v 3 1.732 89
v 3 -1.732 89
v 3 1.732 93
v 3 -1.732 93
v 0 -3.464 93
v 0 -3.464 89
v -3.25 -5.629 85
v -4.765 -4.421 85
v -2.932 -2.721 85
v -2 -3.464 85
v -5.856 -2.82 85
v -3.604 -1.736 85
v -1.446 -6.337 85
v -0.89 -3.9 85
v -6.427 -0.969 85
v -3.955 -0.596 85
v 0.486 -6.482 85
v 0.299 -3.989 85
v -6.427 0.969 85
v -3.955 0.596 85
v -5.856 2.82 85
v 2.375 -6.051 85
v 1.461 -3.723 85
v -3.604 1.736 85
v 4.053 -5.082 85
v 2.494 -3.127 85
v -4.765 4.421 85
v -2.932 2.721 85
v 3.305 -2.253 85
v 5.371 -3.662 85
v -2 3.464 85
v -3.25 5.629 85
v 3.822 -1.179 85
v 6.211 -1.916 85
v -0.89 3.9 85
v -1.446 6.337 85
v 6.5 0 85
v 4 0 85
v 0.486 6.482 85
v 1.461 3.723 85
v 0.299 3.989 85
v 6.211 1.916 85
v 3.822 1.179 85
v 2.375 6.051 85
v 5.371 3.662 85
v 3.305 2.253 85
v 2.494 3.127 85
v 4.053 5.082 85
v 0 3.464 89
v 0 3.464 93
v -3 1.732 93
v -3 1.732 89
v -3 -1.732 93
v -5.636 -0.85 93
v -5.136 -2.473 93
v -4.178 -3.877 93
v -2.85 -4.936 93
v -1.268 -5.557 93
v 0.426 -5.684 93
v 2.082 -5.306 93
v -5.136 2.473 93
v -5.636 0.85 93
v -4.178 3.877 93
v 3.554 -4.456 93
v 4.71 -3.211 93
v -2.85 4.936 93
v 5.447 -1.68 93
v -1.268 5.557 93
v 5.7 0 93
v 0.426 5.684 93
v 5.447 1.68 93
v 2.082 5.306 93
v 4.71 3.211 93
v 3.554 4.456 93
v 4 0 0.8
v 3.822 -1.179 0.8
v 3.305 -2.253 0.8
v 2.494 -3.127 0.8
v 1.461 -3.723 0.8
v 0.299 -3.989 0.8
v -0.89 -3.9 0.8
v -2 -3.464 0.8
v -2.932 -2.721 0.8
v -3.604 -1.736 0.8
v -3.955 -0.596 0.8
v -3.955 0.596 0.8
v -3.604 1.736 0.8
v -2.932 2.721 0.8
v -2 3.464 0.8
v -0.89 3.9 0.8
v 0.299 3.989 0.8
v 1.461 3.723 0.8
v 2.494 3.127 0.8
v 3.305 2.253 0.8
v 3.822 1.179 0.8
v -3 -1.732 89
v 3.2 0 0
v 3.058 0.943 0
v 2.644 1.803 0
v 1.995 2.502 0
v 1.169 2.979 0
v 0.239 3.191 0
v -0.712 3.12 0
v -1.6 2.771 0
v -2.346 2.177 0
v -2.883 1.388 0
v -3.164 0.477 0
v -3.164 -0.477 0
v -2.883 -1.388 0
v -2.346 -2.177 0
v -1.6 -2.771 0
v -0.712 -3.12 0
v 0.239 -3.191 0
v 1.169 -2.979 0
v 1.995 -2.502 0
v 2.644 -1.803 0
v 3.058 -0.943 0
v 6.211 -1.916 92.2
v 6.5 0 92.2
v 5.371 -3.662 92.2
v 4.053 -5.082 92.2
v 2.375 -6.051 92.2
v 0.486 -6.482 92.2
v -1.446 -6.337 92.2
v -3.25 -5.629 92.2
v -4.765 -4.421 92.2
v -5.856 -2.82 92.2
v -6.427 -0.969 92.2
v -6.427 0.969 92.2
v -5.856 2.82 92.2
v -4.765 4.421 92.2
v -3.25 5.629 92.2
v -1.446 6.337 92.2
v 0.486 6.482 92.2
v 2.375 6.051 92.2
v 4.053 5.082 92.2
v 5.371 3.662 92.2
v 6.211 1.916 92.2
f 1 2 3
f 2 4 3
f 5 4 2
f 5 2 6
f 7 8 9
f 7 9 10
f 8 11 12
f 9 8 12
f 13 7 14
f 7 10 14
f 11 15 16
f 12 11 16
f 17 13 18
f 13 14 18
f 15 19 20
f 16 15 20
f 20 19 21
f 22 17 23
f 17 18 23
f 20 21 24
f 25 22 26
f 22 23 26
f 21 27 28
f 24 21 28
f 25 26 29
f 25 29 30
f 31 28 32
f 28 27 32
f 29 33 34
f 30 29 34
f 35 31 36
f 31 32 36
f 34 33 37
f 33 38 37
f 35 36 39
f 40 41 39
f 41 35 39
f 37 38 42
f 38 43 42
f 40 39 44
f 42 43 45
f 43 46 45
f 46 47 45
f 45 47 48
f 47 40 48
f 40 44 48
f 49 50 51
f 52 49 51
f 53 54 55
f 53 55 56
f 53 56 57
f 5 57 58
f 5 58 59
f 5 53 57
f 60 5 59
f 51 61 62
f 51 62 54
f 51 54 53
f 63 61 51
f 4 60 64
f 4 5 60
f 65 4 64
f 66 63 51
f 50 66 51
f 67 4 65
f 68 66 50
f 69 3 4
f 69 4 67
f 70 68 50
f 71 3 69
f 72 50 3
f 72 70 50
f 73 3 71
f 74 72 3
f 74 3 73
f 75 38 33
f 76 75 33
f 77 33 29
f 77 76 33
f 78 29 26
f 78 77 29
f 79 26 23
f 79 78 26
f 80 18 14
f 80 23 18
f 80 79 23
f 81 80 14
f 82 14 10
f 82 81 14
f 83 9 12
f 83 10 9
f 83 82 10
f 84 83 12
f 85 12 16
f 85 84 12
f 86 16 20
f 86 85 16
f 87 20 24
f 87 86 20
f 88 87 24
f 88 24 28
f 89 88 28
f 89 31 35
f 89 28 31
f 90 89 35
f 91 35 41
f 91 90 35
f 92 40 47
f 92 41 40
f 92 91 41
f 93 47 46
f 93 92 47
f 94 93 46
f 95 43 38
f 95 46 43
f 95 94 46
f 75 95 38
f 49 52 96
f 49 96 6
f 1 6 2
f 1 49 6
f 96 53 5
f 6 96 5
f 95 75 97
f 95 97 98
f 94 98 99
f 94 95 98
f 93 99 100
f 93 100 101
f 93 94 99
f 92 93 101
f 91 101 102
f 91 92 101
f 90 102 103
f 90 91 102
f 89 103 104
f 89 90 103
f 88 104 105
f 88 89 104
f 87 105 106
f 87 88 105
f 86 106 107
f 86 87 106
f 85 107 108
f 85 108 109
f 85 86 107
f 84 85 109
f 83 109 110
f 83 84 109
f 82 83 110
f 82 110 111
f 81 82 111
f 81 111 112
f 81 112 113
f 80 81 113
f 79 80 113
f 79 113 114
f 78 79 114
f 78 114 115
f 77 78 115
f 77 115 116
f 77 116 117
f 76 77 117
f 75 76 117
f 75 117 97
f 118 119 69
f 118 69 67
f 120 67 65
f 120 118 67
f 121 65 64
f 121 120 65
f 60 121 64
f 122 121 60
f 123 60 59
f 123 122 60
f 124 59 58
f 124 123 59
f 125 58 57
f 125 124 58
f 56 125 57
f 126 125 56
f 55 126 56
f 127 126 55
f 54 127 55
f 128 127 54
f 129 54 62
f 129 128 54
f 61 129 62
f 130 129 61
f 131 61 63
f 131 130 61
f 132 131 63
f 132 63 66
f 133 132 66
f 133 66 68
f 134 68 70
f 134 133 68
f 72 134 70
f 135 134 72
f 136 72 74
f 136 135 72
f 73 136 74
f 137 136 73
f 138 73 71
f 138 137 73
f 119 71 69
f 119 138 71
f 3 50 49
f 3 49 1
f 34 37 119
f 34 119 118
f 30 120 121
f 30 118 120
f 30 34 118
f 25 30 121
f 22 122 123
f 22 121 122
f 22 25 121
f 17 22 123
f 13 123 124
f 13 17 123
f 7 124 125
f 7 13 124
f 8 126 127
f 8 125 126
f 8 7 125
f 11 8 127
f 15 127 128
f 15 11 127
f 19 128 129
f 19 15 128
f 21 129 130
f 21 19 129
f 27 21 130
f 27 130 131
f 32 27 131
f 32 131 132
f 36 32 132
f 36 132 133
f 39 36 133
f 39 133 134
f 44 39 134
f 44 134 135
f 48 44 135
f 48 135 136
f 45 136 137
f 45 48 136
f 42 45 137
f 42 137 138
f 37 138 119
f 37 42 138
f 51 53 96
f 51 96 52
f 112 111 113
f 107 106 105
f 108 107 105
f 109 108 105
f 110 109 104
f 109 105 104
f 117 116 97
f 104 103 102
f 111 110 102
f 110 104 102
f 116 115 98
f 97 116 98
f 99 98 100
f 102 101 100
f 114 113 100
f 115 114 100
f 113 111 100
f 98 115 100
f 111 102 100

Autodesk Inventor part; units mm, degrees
ref_plane "YZ Plane" through (0, 0, 0) normal (1, 0, 0) x (0, 1, 0)
ref_plane "XZ Plane" through (0, 0, 0) normal (0, 1, 0) x (-1, 0, 0)
ref_plane "XY Plane" through (0, 0, 0) normal (0, 0, 1) x (1, 0, 0)
sketch "Sketch1" plane through (0, 0, 0) normal (0, 0, 1) x (1, 0, 0)
  circle A0 centre (0, 0) radius 4
  dimension "Diameter" = 8
extrude "Extrusion1" add sketch "Sketch1" along normal blind 85
sketch "Sketch2" plane through (0, 0, 85) normal (0, 0, 1) x (1, 0, 0)
  circle A0 centre (0, 0) radius 4 projected
  circle A1 centre (0, 0) radius 6.5
  dimension "Head_Diameter" = 13
extrude "Extrusion2" add sketch "Sketch2" along normal blind 8 contours A0 | A1
sketch "Sketch3" plane through (0, 0, 93) normal (0, 0, 1) x (1, 0, 0)
  circle A0 centre (0, 0) radius 6.5 projected
  circle A1 centre (0, 0) radius 3.4641 construction
  line L0 (0, 3.4641) -> (3, 1.7321)
  line L1 (3, -1.7321) -> (3, 1.7321)
  line L2 (0, 3.4641) -> (-3, 1.7321)
  line L3 (-3, -1.7321) -> (-3, 1.7321)
  line L4 (-3, -1.7321) -> (0, -3.4641)
  line L5 (3, -1.7321) -> (0, -3.4641)
  dimension "Hex_Width" = 6
extrude "Extrusion3" cut sketch "Sketch3" against normal blind 4 contours L0 L1 L5 L4 L3 L2
thread "Thread1" size "M8x1.25" class "4g6g" standard "ANSI Metric M Profile" length 28
chamfer "Chamfer1" distance 0.8 angle 45 2 edges at (-6.5, 0, 93) (-4, 0, 0)
equation "\"d9\" = ThreadLength"
equation "\"d12\" = Chamfer"
equation "\"ThreadLength\" = 28"
equation "\"Chamfer\" = 0.8"
properties part number "SCREW, SOCKET HD, P, 12.9, M8X1.25X85MM"
